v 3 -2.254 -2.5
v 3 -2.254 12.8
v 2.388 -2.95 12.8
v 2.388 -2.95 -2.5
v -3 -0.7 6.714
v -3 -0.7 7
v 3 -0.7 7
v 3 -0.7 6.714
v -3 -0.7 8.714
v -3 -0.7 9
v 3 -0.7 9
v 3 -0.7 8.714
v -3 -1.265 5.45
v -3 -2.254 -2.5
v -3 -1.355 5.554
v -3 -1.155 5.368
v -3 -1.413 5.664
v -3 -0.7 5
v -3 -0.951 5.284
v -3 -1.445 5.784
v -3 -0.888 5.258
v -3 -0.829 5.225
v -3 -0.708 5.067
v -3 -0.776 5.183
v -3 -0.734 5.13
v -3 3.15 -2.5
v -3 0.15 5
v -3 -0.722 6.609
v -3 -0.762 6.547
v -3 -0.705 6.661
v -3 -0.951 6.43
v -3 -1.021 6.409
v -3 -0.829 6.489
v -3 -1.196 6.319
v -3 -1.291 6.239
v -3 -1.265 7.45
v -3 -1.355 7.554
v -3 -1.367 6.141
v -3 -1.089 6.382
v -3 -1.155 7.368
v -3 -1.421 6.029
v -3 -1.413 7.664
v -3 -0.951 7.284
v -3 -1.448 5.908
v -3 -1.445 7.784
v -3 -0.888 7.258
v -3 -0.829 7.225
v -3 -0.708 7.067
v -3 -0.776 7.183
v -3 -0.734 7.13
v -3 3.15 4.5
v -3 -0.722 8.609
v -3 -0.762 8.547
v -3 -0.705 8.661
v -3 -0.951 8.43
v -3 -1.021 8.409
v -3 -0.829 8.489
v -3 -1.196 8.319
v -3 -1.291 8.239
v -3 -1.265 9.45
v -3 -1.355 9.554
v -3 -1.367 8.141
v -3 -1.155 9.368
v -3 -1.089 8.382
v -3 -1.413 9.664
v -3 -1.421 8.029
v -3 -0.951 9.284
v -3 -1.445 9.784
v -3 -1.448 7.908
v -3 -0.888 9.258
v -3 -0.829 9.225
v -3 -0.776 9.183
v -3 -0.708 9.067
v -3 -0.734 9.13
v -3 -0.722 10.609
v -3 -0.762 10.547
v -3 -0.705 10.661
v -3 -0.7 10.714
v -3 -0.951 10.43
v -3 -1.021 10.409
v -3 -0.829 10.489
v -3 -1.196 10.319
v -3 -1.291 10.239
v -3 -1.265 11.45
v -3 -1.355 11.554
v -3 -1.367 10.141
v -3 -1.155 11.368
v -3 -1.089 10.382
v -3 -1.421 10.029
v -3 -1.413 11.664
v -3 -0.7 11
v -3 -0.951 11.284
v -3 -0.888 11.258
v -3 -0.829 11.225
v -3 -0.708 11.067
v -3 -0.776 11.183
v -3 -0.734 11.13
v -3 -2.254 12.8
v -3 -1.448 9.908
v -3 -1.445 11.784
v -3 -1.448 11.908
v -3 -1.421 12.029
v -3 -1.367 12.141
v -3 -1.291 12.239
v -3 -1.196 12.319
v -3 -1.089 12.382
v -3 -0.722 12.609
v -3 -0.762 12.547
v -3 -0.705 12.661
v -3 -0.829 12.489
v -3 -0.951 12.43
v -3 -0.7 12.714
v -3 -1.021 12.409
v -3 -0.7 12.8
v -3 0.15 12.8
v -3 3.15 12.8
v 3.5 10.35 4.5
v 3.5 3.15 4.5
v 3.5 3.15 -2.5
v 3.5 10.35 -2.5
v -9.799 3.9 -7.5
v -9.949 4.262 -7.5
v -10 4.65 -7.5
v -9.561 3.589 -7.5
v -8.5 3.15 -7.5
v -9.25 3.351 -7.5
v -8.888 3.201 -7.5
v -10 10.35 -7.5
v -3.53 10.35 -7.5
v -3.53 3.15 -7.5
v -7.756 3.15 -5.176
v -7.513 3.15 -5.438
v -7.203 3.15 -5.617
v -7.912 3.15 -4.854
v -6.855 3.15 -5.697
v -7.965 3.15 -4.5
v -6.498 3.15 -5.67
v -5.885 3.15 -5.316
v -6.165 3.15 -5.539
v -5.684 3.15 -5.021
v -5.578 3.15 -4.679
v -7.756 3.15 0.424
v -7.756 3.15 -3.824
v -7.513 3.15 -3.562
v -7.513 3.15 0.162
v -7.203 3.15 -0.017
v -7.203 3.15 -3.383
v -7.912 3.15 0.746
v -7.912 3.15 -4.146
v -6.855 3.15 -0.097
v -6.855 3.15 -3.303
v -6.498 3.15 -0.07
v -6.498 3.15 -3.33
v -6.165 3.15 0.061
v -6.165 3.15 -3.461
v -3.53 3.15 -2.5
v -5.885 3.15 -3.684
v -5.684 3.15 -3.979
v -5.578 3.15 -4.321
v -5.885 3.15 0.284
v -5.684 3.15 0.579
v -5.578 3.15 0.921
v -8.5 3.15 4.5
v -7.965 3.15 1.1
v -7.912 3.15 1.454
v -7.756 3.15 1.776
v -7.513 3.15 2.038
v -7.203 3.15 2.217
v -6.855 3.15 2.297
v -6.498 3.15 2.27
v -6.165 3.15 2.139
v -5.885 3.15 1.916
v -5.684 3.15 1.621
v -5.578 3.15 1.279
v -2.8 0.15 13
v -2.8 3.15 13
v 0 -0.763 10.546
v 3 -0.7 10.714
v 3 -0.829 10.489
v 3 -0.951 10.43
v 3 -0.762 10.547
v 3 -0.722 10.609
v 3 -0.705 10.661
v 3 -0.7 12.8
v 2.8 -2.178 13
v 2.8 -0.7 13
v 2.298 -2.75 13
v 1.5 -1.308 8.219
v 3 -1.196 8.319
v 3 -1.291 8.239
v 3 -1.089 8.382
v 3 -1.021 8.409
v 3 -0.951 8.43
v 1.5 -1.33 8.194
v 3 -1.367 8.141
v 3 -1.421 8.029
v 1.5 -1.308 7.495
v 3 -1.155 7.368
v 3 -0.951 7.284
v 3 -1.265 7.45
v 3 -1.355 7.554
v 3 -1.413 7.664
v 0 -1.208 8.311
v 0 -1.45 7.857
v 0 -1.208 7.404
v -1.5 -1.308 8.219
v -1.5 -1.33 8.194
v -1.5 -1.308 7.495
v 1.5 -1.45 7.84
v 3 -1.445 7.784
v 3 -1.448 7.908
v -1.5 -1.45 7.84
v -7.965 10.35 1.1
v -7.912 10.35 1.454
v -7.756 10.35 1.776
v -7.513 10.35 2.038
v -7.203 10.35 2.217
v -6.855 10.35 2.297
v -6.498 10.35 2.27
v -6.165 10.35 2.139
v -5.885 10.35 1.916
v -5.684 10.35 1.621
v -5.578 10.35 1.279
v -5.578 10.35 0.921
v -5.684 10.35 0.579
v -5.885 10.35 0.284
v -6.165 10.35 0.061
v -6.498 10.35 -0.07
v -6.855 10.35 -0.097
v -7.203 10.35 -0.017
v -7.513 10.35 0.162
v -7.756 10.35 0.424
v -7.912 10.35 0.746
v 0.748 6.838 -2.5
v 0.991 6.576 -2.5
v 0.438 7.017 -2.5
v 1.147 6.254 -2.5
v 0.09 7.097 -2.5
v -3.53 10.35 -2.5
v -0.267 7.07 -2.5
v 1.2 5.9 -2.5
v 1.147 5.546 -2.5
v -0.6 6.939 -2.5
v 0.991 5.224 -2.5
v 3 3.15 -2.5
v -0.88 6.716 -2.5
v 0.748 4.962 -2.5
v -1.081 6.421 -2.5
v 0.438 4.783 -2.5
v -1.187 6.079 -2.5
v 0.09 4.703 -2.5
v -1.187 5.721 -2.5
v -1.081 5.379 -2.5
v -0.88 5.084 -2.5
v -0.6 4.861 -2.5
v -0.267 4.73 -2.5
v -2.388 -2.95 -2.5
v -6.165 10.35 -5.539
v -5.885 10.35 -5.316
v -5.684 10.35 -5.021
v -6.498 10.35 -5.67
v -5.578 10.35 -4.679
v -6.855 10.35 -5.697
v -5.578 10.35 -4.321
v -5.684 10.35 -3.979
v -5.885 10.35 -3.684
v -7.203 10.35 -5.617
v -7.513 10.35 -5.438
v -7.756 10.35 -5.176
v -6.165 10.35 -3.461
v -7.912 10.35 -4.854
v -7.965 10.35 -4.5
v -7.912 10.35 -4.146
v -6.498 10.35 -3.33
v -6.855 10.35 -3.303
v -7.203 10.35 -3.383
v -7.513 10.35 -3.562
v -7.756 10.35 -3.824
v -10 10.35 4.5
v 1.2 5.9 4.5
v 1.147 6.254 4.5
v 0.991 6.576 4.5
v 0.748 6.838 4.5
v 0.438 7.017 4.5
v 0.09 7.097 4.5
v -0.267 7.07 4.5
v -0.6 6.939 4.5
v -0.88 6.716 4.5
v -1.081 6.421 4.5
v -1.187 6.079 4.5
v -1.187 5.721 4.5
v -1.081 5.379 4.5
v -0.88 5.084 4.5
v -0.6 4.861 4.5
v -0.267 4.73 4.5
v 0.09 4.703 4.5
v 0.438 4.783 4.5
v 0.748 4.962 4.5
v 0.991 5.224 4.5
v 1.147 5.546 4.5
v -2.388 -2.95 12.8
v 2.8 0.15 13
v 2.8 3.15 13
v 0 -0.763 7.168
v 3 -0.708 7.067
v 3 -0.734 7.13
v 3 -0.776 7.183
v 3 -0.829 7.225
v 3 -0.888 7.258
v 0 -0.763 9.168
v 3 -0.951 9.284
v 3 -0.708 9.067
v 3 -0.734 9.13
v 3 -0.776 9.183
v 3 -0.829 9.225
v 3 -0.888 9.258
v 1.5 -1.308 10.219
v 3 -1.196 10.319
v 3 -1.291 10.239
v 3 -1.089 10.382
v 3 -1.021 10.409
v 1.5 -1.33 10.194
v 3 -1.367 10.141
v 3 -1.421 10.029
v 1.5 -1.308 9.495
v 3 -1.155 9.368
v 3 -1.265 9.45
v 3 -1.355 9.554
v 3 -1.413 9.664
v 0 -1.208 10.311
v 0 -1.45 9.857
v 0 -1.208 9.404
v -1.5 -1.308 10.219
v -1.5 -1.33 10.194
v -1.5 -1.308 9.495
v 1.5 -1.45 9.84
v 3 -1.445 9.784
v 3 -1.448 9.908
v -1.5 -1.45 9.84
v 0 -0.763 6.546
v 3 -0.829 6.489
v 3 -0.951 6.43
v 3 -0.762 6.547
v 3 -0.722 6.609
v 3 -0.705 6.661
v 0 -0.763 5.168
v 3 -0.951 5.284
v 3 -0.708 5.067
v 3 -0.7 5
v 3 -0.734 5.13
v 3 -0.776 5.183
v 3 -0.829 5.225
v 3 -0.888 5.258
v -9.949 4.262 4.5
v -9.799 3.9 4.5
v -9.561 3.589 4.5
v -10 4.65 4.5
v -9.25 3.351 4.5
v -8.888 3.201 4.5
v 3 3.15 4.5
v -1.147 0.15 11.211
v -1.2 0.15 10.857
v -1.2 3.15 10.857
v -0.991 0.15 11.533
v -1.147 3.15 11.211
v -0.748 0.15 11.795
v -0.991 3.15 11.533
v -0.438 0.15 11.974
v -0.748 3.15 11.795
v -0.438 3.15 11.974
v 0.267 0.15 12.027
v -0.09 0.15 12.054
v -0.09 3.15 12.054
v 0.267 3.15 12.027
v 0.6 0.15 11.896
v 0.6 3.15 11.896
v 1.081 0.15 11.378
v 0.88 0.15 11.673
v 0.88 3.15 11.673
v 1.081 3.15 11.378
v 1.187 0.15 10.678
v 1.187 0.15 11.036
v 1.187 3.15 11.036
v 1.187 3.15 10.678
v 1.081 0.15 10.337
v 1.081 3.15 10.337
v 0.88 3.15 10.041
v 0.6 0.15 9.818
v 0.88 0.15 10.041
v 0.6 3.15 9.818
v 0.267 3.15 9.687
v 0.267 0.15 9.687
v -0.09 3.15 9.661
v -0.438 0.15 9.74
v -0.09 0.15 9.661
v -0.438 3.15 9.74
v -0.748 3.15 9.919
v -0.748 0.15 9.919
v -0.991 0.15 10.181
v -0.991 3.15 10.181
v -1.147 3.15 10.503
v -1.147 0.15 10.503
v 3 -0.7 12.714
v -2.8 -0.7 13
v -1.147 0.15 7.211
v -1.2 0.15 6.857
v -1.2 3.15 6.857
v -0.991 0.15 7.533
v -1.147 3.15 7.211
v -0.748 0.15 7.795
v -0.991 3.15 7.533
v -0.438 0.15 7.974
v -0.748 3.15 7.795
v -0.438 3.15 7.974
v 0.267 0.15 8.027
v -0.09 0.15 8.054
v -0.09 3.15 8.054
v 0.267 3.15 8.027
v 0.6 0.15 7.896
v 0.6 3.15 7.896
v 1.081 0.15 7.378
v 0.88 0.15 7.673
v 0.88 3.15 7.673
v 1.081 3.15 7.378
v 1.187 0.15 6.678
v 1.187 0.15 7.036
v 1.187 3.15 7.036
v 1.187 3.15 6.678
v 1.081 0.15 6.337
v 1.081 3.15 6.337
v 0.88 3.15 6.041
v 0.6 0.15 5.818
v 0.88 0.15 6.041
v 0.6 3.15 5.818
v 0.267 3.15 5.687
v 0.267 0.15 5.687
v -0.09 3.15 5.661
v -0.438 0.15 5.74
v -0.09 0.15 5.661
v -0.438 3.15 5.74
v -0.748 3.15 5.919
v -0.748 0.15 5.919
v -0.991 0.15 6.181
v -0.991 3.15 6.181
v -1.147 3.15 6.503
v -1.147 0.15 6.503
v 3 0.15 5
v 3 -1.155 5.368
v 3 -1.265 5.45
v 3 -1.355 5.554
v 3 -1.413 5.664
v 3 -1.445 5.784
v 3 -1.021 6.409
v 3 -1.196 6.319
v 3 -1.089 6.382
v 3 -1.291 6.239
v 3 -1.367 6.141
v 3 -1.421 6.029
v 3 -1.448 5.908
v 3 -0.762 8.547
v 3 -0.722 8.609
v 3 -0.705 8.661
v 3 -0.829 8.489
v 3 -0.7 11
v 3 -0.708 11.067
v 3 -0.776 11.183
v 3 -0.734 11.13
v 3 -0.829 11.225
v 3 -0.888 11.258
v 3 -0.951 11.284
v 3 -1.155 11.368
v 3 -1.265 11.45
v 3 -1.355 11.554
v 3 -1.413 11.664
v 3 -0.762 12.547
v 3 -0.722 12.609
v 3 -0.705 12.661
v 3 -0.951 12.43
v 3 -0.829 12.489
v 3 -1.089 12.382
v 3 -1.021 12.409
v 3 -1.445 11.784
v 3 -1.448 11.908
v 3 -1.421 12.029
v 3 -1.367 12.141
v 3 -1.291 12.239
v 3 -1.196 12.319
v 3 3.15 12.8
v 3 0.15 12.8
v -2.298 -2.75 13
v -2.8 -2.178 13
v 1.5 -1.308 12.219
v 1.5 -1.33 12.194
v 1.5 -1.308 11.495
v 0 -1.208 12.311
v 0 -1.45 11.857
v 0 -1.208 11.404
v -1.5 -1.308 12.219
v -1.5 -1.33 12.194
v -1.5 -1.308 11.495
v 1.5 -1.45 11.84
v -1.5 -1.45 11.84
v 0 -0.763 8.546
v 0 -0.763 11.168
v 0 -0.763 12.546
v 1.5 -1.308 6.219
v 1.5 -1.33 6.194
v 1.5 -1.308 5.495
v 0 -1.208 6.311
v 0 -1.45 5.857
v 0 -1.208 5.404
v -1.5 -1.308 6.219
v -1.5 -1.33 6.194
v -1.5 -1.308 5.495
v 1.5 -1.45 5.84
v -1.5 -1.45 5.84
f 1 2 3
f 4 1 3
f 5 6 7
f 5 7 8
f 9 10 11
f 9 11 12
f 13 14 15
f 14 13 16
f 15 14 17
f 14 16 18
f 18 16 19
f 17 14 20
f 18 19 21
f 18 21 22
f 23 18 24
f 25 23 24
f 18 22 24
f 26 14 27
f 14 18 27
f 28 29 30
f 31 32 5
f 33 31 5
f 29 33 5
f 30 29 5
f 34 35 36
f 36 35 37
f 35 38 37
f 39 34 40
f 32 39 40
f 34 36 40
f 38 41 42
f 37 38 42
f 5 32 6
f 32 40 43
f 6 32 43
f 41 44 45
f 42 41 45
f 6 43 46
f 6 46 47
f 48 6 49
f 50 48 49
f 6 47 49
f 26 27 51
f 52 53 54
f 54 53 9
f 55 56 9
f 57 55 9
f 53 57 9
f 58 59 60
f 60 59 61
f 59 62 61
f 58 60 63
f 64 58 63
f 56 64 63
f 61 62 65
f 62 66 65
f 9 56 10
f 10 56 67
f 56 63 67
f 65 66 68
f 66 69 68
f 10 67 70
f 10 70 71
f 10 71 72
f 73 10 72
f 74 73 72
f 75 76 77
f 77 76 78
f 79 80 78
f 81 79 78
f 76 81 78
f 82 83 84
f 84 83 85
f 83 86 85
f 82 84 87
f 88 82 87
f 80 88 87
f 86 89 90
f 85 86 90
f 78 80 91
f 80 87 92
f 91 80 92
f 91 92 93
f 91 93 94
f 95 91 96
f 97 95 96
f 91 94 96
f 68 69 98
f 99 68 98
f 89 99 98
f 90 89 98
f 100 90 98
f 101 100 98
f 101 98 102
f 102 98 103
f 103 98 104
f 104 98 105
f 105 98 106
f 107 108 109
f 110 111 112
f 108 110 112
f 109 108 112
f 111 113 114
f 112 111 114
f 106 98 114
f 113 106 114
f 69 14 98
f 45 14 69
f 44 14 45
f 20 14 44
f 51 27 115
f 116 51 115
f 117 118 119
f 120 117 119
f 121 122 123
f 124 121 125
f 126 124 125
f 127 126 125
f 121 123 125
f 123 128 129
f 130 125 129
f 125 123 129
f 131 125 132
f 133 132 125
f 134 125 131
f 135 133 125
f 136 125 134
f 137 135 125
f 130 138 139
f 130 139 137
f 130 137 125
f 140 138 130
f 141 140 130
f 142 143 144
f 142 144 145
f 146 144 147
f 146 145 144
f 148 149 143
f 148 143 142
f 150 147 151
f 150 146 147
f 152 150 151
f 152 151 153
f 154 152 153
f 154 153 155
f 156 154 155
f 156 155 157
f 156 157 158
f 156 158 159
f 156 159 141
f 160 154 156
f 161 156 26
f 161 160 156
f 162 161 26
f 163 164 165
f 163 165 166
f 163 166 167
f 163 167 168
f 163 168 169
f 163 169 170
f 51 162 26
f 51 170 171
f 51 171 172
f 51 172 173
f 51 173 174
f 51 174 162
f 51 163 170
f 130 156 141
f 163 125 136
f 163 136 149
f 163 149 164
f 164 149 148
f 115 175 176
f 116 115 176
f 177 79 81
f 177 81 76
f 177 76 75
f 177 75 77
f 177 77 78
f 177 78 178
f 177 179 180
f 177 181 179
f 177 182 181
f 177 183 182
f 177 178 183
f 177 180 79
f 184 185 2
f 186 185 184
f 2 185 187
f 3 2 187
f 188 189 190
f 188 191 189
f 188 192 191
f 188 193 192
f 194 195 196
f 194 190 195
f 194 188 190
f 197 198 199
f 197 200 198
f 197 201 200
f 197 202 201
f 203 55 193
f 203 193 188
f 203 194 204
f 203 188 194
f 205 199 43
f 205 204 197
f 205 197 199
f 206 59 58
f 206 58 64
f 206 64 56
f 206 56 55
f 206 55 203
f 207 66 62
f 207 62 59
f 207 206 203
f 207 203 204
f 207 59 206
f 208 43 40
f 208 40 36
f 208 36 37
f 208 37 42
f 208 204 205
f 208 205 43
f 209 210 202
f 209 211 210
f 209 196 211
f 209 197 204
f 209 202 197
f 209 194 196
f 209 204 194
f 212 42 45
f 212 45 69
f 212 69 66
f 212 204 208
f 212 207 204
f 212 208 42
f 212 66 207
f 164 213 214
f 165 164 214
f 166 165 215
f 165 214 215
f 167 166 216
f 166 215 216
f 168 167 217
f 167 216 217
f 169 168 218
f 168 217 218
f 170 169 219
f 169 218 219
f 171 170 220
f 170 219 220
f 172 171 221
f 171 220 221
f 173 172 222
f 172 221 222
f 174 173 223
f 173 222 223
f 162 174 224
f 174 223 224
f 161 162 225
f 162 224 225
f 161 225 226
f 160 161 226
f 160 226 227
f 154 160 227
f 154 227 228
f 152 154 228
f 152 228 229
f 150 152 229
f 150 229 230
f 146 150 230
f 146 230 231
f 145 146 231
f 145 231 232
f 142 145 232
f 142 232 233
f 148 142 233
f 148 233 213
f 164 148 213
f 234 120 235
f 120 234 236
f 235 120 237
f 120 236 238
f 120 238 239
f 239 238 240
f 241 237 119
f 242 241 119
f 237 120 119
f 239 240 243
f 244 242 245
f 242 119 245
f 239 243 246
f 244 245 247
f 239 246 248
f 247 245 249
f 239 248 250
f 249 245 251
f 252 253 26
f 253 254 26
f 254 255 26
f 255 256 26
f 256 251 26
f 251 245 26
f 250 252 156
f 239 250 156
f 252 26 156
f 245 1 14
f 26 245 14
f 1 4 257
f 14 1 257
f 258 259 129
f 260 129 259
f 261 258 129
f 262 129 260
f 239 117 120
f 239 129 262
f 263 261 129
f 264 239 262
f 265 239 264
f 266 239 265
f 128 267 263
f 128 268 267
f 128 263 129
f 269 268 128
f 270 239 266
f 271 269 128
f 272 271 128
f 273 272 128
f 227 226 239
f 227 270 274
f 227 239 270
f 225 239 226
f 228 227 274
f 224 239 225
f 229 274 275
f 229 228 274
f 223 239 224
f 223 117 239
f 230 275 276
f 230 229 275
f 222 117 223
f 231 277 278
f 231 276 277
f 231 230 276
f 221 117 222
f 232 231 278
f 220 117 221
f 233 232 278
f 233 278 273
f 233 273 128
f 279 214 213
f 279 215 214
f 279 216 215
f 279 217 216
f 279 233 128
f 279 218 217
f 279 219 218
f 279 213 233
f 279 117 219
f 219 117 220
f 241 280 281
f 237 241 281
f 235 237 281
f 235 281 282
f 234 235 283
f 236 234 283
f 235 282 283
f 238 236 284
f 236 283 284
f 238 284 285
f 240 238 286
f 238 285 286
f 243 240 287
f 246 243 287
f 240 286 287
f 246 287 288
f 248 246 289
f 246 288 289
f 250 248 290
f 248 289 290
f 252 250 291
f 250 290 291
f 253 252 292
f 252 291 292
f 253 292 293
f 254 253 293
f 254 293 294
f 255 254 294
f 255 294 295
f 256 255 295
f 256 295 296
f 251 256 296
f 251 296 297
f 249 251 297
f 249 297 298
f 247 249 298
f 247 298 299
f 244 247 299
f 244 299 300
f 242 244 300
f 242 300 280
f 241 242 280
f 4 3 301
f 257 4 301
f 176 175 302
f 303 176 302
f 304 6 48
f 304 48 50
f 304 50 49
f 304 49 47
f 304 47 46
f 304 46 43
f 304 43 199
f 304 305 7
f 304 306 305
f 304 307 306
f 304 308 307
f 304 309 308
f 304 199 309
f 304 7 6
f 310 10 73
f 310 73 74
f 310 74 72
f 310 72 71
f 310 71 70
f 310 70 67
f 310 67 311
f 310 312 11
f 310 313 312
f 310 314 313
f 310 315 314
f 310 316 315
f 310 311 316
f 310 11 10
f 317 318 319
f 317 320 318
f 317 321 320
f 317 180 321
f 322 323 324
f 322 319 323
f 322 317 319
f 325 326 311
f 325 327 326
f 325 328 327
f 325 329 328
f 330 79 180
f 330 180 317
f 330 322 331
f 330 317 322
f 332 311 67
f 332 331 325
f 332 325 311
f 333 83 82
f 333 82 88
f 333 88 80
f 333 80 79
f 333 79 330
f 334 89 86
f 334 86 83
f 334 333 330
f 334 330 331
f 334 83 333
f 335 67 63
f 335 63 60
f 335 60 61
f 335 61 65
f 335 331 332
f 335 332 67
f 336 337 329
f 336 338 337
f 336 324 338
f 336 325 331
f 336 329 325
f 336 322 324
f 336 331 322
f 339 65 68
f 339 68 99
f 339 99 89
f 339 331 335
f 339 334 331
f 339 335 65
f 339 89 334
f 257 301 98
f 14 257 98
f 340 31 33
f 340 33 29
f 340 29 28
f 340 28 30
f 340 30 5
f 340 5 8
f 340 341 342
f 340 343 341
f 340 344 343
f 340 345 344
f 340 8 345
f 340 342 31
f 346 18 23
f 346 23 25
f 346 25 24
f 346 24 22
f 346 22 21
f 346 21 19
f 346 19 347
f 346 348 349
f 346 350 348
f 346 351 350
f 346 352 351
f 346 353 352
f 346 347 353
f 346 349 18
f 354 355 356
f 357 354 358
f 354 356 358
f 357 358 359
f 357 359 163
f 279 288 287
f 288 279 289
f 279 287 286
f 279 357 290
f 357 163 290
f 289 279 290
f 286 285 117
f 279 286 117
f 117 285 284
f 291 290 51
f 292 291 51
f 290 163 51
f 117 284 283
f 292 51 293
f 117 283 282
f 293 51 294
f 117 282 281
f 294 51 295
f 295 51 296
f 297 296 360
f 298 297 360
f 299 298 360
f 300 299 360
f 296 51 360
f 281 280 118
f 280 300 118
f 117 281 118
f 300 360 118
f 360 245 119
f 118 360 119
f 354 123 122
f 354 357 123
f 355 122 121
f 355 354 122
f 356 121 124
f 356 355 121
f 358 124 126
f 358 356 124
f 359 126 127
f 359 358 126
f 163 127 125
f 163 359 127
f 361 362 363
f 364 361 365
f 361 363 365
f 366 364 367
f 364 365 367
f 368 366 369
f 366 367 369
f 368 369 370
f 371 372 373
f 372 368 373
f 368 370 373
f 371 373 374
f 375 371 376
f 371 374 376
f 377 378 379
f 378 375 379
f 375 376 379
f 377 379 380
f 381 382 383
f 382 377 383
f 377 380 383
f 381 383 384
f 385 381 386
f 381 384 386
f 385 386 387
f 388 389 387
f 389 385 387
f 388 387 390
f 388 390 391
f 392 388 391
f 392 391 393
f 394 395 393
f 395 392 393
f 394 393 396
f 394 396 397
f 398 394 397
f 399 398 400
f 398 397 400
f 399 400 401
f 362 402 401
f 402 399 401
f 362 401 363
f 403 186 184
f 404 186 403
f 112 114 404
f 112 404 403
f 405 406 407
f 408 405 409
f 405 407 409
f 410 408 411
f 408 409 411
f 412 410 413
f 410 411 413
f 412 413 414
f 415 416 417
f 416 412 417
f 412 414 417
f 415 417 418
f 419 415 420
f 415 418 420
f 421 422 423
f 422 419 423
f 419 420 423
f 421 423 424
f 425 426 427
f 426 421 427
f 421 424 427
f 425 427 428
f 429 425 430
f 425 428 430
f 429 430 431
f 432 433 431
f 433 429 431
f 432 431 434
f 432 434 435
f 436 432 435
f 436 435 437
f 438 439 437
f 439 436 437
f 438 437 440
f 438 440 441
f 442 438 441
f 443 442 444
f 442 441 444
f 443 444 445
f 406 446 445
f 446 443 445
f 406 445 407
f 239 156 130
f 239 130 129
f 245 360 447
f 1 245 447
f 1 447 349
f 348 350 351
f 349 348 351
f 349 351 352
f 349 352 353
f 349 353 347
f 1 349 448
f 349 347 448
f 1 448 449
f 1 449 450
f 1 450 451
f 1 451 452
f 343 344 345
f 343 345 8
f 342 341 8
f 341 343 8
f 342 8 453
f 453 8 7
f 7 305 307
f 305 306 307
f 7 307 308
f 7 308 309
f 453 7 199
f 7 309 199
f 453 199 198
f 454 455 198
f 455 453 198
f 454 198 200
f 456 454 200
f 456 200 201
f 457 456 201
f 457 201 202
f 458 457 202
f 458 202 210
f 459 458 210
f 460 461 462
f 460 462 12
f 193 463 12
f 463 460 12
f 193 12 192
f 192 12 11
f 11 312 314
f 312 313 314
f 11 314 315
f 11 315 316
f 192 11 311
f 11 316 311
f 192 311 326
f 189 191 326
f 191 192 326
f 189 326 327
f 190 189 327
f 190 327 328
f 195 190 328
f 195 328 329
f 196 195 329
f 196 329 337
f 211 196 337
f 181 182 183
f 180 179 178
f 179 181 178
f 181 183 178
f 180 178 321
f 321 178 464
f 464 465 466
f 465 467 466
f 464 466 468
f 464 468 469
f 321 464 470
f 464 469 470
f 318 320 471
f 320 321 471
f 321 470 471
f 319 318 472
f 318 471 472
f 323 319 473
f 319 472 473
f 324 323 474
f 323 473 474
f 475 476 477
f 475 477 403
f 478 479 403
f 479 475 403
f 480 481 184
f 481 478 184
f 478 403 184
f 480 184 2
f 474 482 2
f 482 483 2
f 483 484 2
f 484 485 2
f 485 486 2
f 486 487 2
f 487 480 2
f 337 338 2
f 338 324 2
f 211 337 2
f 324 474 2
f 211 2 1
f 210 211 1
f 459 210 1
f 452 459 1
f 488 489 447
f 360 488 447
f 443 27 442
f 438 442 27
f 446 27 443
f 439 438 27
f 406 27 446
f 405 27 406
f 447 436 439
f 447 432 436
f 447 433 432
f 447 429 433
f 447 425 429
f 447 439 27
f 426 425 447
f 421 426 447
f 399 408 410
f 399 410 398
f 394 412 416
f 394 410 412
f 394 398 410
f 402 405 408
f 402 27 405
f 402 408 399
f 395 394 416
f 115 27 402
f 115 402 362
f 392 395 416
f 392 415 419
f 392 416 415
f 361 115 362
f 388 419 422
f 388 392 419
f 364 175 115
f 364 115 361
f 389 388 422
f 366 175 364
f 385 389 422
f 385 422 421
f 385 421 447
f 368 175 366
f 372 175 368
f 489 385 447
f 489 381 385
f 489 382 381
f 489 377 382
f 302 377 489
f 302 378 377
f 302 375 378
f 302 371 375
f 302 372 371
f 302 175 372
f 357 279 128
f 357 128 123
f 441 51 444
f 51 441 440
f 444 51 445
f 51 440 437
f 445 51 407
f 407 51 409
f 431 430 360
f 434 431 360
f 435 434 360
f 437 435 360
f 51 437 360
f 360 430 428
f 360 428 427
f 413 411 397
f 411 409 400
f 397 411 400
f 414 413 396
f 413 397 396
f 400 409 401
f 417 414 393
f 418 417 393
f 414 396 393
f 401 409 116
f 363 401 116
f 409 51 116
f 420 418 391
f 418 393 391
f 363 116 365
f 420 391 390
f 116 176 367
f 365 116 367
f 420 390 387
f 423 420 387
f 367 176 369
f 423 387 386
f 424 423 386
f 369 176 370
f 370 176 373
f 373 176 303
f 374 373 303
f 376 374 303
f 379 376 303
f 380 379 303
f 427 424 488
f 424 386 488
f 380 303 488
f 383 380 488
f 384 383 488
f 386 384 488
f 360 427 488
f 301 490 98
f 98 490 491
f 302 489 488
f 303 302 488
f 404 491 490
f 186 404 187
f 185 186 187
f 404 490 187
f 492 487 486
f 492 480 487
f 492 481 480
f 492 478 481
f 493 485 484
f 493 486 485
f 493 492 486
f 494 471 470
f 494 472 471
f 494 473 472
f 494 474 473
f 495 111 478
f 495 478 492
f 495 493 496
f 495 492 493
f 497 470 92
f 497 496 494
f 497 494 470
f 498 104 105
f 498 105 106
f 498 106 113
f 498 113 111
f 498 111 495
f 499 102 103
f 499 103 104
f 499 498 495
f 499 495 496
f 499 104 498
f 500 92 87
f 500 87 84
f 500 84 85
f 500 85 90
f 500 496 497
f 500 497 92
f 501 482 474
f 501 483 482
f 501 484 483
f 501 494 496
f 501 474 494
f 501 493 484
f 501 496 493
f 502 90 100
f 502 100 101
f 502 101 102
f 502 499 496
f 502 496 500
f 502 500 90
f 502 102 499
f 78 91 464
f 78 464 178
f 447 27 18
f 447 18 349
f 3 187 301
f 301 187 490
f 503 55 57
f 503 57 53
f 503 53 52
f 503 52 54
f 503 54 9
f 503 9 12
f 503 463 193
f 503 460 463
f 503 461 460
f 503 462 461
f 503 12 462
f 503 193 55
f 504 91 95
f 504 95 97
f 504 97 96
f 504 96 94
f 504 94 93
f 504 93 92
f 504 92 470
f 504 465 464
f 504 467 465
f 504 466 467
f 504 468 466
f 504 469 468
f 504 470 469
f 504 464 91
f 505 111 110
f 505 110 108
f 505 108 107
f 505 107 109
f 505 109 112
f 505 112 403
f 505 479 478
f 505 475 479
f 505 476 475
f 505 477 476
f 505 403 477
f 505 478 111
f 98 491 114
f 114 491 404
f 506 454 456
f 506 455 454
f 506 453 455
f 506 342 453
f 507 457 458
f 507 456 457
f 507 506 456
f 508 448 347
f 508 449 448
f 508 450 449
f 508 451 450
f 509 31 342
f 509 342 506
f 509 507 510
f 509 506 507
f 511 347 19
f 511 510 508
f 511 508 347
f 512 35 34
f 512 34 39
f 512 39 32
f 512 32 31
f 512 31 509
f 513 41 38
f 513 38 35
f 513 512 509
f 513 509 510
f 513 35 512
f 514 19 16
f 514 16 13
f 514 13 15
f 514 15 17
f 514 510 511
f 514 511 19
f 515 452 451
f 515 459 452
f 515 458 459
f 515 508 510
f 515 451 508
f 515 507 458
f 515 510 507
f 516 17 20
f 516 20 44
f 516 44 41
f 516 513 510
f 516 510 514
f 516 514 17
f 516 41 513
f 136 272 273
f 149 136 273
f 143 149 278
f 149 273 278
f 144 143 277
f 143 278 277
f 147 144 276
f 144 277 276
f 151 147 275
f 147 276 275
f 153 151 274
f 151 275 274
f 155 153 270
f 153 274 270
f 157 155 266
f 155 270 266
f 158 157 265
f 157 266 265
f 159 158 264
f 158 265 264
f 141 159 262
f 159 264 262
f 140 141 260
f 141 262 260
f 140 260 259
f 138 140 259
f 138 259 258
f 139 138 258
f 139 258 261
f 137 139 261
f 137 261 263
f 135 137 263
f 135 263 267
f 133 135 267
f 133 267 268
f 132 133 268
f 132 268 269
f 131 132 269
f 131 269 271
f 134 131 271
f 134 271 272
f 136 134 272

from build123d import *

# Parameters (mm, degrees)
BOSS_EXTRUDE1_DEPTH     = 13
SKETCH6_W               = 6
SKETCH6_H               = 5
BOSS_EXTRUDE4_DEPTH     = 5.6
SKETCH16_W              = 6
SKETCH16_H              = 8
BOSS_EXTRUDE5_DEPTH     = 0.1
CUT_EXTRUDE6_DEPTH      = 4
CUT_EXTRUDE6_DEPTH_BACK = 3.6
SKETCH15_R              = 1.2
CUT_EXTRUDE7_DEPTH      = 8.7202
CUT_EXTRUDE8_START      = -0.2202
SKETCH19_W              = 6
SKETCH19_H              = 8
SKETCH19_R              = 1.2
CUT_EXTRUDE8_DEPTH      = 0.2202
SKETCH12_R              = 1.2
CUT_EXTRUDE5_DEPTH      = 6
SKETCH21_R              = 1.2
BOSS_EXTRUDE6_DEPTH     = 2.5
SKETCH24_W              = 6
SKETCH24_H              = 5.5
CUT_EXTRUDE10_DEPTH     = 8.5
BOSS_EXTRUDE8_DEPTH     = 7.2
FILLET4_R               = 1.5
SKETCH26_R              = 1.2
CUT_EXTRUDE11_DEPTH     = 10
CHAMFER1_SIZE           = 0.2
BOSS_EXTRUDE9_DEPTH     = 5
SKETCH31_R              = 1.2
CUT_EXTRUDE12_DEPTH     = 8


with BuildPart() as part:
    # Sketch1 → Boss-Extrude1 (new body)
    with BuildSketch(Plane.XY):
        Polygon((3, 3.05), (3, -2.253801214), (2.388188946, -2.95), (-2.388188946, -2.95), (-3, -2.253801214), (-3, 3.05), align=None)
    extrude(amount=BOSS_EXTRUDE1_DEPTH)

    # Sketch6 → Boss-Extrude4 (add)
    with BuildSketch(Plane(origin=(0, 3.05, 0), x_dir=(1, 0, 0), z_dir=(0, 1, 0))):
        with Locations((0, -2.5)):
            Rectangle(SKETCH6_W, SKETCH6_H)
    extrude(amount=BOSS_EXTRUDE4_DEPTH)

    # Sketch16 → Boss-Extrude5 (add)
    with BuildSketch(Plane(origin=(0, 3.05, 0), x_dir=(1, 0, 0), z_dir=(0, 1, 0))):
        with Locations((0, -9)):
            Rectangle(SKETCH16_W, SKETCH16_H)
    extrude(amount=BOSS_EXTRUDE5_DEPTH)

    # Sketch18 → Cut-Extrude6 (cut, two sides: drawn at the far end of the back side and taken through both)
    with BuildSketch(Plane(origin=(0, 0, 0), x_dir=(0, 0, -1), z_dir=(1, 0, 0)).offset(-CUT_EXTRUDE6_DEPTH_BACK)):
        with BuildLine():
            Line((-8.8572, -0.0702), (-12.8572, -0.0702))
            Line((-12.8572, -0.0702), (-13, -0.0702))
            Line((-13, -0.0702), (-13, -0.7))
            Line((-13, -0.7), (-12.8572, -0.7))
            Line((-12.8572, -0.7), (-12.7144, -0.7))
            add(Edge.make_bspline(
                [(-12.7144, -0.7), (-12.5198, -0.7), (-12.43, -0.9509)],
                knots=[0.103448276, 0.103448276, 0.103448276, 0.137931034, 0.137931034, 0.137931034], degree=2))
            add(Edge.make_bspline(
                [(-12.43, -0.9509), (-12.3594, -1.2388), (-12.13, -1.45), (-11.8572, -1.45)],
                knots=[0.137931034, 0.137931034, 0.137931034, 0.137931034, 0.172413793, 0.172413793, 0.172413793, 0.172413793], degree=3))
            add(Edge.make_bspline(
                [(-11.8572, -1.45), (-11.5844, -1.45), (-11.355, -1.2388), (-11.2844, -0.9509)],
                knots=[0.172413793, 0.172413793, 0.172413793, 0.172413793, 0.206896552, 0.206896552, 0.206896552, 0.206896552], degree=3))
            add(Edge.make_bspline(
                [(-11.2844, -0.9509), (-11.1946, -0.7), (-11, -0.7)],
                knots=[0.206896552, 0.206896552, 0.206896552, 0.24137931, 0.24137931, 0.24137931], degree=2))
            Line((-11, -0.7), (-10.8572, -0.7))
            Line((-10.8572, -0.7), (-10.7144, -0.7))
            add(Edge.make_bspline(
                [(-10.7144, -0.7), (-10.5198, -0.7), (-10.43, -0.9509)],
                knots=[0.310344828, 0.310344828, 0.310344828, 0.344827586, 0.344827586, 0.344827586], degree=2))
            add(Edge.make_bspline(
                [(-10.43, -0.9509), (-10.3594, -1.2388), (-10.13, -1.45), (-9.8572, -1.45)],
                knots=[0.344827586, 0.344827586, 0.344827586, 0.344827586, 0.379310345, 0.379310345, 0.379310345, 0.379310345], degree=3))
            add(Edge.make_bspline(
                [(-9.8572, -1.45), (-9.5844, -1.45), (-9.355, -1.2388), (-9.2844, -0.9509)],
                knots=[0.379310345, 0.379310345, 0.379310345, 0.379310345, 0.413793103, 0.413793103, 0.413793103, 0.413793103], degree=3))
            add(Edge.make_bspline(
                [(-9.2844, -0.9509), (-9.1946, -0.7), (-9, -0.7)],
                knots=[0.413793103, 0.413793103, 0.413793103, 0.448275862, 0.448275862, 0.448275862], degree=2))
            Line((-9, -0.7), (-8.8572, -0.7))
            Line((-8.8572, -0.7), (-8.7144, -0.7))
            add(Edge.make_bspline(
                [(-8.7144, -0.7), (-8.5198, -0.7), (-8.43, -0.9509)],
                knots=[0.517241379, 0.517241379, 0.517241379, 0.551724138, 0.551724138, 0.551724138], degree=2))
            add(Edge.make_bspline(
                [(-8.43, -0.9509), (-8.3594, -1.2388), (-8.13, -1.45), (-7.8572, -1.45)],
                knots=[0.551724138, 0.551724138, 0.551724138, 0.551724138, 0.586206897, 0.586206897, 0.586206897, 0.586206897], degree=3))
            add(Edge.make_bspline(
                [(-7.8572, -1.45), (-7.5844, -1.45), (-7.355, -1.2388), (-7.2844, -0.9509)],
                knots=[0.586206897, 0.586206897, 0.586206897, 0.586206897, 0.620689655, 0.620689655, 0.620689655, 0.620689655], degree=3))
            add(Edge.make_bspline(
                [(-7.2844, -0.9509), (-7.1946, -0.7), (-7, -0.7)],
                knots=[0.620689655, 0.620689655, 0.620689655, 0.655172414, 0.655172414, 0.655172414], degree=2))
            Line((-7, -0.7), (-6.8572, -0.7))
            Line((-6.8572, -0.7), (-6.7144, -0.7))
            add(Edge.make_bspline(
                [(-6.7144, -0.7), (-6.5198, -0.7), (-6.43, -0.9509)],
                knots=[0.724137931, 0.724137931, 0.724137931, 0.75862069, 0.75862069, 0.75862069], degree=2))
            add(Edge.make_bspline(
                [(-6.43, -0.9509), (-6.3594, -1.2388), (-6.13, -1.45), (-5.8572, -1.45)],
                knots=[0.75862069, 0.75862069, 0.75862069, 0.75862069, 0.793103448, 0.793103448, 0.793103448, 0.793103448], degree=3))
            add(Edge.make_bspline(
                [(-5.8572, -1.45), (-5.5844, -1.45), (-5.355, -1.2388), (-5.2844, -0.9509)],
                knots=[0.793103448, 0.793103448, 0.793103448, 0.793103448, 0.827586207, 0.827586207, 0.827586207, 0.827586207], degree=3))
            add(Edge.make_bspline(
                [(-5.2844, -0.9509), (-5.1946, -0.7), (-5, -0.7)],
                knots=[0.827586207, 0.827586207, 0.827586207, 0.862068966, 0.862068966, 0.862068966], degree=2))
            Line((-5, -0.7), (-5, -0.0702))
            Line((-5, -0.0702), (-8.8572, -0.0702))
        make_face()
    extrude(amount=CUT_EXTRUDE6_DEPTH + CUT_EXTRUDE6_DEPTH_BACK, mode=Mode.SUBTRACT)

    # Sketch15 → Cut-Extrude7 (cut)
    with BuildSketch(Plane(origin=(0, 8.65, 0), x_dir=(1, 0, 0), z_dir=(0, 1, 0))):
        with Locations(Location((0, -10.8572, 0), (0, 0, 180))):
            Circle(SKETCH15_R)
        with Locations(Location((0, -6.8572, 0), (0, 0, 180))):
            Circle(SKETCH15_R)
    extrude(amount=-CUT_EXTRUDE7_DEPTH, mode=Mode.SUBTRACT)

    # Sketch19 → Cut-Extrude8 (cut)
    with BuildSketch(Plane.XZ.offset(0.0702).offset(CUT_EXTRUDE8_START)):
        with Locations((0, 9)):
            Rectangle(SKETCH19_W, SKETCH19_H)
        with Locations(Location((0, 10.8572, 0), (0, 0, 180))):
            Circle(SKETCH19_R, mode=Mode.SUBTRACT)
        with Locations(Location((0, 6.8572, 0), (0, 0, 180))):
            Circle(SKETCH19_R, mode=Mode.SUBTRACT)
    extrude(amount=CUT_EXTRUDE8_DEPTH, mode=Mode.SUBTRACT)

    # Sketch12 → Cut-Extrude5 (cut)
    with BuildSketch(Plane.XY.offset(5)):
        with Locations((0, 5.85)):
            Circle(SKETCH12_R)
    extrude(amount=-CUT_EXTRUDE5_DEPTH, mode=Mode.SUBTRACT)

    # Sketch21 → Boss-Extrude6 (add)
    with BuildSketch(Plane(origin=(0, 0, 0), x_dir=(-1, 0, 0), z_dir=(0, 0, -1))):
        Polygon((-2.388188946, -2.95), (2.388188946, -2.95), (3, -2.253801214), (3, 8.65), (-3, 8.65), (-3, -2.253801214), align=None)
        with Locations(Location((0, 5.85, 0), (0, 0, 180))):
            Circle(SKETCH21_R, mode=Mode.SUBTRACT)
    extrude(amount=BOSS_EXTRUDE6_DEPTH)

    # Sketch24 → Cut-Extrude10 (cut)
    with BuildSketch(Plane.XY.offset(5)):
        with Locations((0, 5.9)):
            Rectangle(SKETCH24_W, SKETCH24_H)
    extrude(amount=-CUT_EXTRUDE10_DEPTH, mode=Mode.SUBTRACT)

    # Sketch25 → Boss-Extrude8 (add)
    with BuildSketch(Plane(origin=(0, 3.15, 0), x_dir=(1, 0, 0), z_dir=(0, 1, 0))):
        Polygon((-10, -4.5), (0, -4.5), (3.5, -4.5), (3.5, 2.5), (-10, 2.5), align=None)
    extrude(amount=BOSS_EXTRUDE8_DEPTH)

    # Fillet4
    fillet4_edges = [part.edges().sort_by_distance(p)[0] for p in [
        (-10, 3.15, 1),
    ]]
    fillet(fillet4_edges, radius=FILLET4_R)

    # Sketch26 → Cut-Extrude11 (cut)
    with BuildSketch(Plane.XY.offset(4.5)):
        with Locations((0, 5.9)):
            Circle(SKETCH26_R)
    extrude(amount=-CUT_EXTRUDE11_DEPTH, mode=Mode.SUBTRACT)

    # Chamfer1
    chamfer1_edges = [part.edges().sort_by_distance(p)[0] for p in [
        (-2.694094473, -2.601900607, 13),
        (0, -2.95, 13),
        (2.694094473, -2.601900607, 13),
        (3, 1.65, 13),
        (3, -1.476900607, 13),
        (-3, -1.476900607, 13),
        (-3, 1.65, 13),
    ]]
    chamfer(chamfer1_edges, length=CHAMFER1_SIZE)

    # Sketch29 → Boss-Extrude9 (add)
    with BuildSketch(Plane(origin=(0, 0, -2.5), x_dir=(-1, 0, 0), z_dir=(0, 0, -1))):
        with BuildLine():
            Line((3.53, 3.15), (3.53, 10.35))
            Line((3.53, 10.35), (10, 10.35))
            Line((10, 10.35), (10, 4.65))
            ThreePointArc((10, 4.65), (9.560660172, 3.589339828), (8.5, 3.15))
            Line((8.5, 3.15), (3.53, 3.15))
        make_face()
    extrude(amount=BOSS_EXTRUDE9_DEPTH)

    # Sketch31 → Cut-Extrude12 (cut)
    with BuildSketch(Plane(origin=(0, 10.35, 0), x_dir=(1, 0, 0), z_dir=(0, 1, 0))):
        with Locations(Location((-6.765, 4.5, 0), (0, 0, 180))):
            Circle(SKETCH31_R)
        with Locations(Location((-6.765, -1.1, 0), (0, 0, 180))):
            Circle(SKETCH31_R)
    extrude(amount=-CUT_EXTRUDE12_DEPTH, mode=Mode.SUBTRACT)


solid = part.part
